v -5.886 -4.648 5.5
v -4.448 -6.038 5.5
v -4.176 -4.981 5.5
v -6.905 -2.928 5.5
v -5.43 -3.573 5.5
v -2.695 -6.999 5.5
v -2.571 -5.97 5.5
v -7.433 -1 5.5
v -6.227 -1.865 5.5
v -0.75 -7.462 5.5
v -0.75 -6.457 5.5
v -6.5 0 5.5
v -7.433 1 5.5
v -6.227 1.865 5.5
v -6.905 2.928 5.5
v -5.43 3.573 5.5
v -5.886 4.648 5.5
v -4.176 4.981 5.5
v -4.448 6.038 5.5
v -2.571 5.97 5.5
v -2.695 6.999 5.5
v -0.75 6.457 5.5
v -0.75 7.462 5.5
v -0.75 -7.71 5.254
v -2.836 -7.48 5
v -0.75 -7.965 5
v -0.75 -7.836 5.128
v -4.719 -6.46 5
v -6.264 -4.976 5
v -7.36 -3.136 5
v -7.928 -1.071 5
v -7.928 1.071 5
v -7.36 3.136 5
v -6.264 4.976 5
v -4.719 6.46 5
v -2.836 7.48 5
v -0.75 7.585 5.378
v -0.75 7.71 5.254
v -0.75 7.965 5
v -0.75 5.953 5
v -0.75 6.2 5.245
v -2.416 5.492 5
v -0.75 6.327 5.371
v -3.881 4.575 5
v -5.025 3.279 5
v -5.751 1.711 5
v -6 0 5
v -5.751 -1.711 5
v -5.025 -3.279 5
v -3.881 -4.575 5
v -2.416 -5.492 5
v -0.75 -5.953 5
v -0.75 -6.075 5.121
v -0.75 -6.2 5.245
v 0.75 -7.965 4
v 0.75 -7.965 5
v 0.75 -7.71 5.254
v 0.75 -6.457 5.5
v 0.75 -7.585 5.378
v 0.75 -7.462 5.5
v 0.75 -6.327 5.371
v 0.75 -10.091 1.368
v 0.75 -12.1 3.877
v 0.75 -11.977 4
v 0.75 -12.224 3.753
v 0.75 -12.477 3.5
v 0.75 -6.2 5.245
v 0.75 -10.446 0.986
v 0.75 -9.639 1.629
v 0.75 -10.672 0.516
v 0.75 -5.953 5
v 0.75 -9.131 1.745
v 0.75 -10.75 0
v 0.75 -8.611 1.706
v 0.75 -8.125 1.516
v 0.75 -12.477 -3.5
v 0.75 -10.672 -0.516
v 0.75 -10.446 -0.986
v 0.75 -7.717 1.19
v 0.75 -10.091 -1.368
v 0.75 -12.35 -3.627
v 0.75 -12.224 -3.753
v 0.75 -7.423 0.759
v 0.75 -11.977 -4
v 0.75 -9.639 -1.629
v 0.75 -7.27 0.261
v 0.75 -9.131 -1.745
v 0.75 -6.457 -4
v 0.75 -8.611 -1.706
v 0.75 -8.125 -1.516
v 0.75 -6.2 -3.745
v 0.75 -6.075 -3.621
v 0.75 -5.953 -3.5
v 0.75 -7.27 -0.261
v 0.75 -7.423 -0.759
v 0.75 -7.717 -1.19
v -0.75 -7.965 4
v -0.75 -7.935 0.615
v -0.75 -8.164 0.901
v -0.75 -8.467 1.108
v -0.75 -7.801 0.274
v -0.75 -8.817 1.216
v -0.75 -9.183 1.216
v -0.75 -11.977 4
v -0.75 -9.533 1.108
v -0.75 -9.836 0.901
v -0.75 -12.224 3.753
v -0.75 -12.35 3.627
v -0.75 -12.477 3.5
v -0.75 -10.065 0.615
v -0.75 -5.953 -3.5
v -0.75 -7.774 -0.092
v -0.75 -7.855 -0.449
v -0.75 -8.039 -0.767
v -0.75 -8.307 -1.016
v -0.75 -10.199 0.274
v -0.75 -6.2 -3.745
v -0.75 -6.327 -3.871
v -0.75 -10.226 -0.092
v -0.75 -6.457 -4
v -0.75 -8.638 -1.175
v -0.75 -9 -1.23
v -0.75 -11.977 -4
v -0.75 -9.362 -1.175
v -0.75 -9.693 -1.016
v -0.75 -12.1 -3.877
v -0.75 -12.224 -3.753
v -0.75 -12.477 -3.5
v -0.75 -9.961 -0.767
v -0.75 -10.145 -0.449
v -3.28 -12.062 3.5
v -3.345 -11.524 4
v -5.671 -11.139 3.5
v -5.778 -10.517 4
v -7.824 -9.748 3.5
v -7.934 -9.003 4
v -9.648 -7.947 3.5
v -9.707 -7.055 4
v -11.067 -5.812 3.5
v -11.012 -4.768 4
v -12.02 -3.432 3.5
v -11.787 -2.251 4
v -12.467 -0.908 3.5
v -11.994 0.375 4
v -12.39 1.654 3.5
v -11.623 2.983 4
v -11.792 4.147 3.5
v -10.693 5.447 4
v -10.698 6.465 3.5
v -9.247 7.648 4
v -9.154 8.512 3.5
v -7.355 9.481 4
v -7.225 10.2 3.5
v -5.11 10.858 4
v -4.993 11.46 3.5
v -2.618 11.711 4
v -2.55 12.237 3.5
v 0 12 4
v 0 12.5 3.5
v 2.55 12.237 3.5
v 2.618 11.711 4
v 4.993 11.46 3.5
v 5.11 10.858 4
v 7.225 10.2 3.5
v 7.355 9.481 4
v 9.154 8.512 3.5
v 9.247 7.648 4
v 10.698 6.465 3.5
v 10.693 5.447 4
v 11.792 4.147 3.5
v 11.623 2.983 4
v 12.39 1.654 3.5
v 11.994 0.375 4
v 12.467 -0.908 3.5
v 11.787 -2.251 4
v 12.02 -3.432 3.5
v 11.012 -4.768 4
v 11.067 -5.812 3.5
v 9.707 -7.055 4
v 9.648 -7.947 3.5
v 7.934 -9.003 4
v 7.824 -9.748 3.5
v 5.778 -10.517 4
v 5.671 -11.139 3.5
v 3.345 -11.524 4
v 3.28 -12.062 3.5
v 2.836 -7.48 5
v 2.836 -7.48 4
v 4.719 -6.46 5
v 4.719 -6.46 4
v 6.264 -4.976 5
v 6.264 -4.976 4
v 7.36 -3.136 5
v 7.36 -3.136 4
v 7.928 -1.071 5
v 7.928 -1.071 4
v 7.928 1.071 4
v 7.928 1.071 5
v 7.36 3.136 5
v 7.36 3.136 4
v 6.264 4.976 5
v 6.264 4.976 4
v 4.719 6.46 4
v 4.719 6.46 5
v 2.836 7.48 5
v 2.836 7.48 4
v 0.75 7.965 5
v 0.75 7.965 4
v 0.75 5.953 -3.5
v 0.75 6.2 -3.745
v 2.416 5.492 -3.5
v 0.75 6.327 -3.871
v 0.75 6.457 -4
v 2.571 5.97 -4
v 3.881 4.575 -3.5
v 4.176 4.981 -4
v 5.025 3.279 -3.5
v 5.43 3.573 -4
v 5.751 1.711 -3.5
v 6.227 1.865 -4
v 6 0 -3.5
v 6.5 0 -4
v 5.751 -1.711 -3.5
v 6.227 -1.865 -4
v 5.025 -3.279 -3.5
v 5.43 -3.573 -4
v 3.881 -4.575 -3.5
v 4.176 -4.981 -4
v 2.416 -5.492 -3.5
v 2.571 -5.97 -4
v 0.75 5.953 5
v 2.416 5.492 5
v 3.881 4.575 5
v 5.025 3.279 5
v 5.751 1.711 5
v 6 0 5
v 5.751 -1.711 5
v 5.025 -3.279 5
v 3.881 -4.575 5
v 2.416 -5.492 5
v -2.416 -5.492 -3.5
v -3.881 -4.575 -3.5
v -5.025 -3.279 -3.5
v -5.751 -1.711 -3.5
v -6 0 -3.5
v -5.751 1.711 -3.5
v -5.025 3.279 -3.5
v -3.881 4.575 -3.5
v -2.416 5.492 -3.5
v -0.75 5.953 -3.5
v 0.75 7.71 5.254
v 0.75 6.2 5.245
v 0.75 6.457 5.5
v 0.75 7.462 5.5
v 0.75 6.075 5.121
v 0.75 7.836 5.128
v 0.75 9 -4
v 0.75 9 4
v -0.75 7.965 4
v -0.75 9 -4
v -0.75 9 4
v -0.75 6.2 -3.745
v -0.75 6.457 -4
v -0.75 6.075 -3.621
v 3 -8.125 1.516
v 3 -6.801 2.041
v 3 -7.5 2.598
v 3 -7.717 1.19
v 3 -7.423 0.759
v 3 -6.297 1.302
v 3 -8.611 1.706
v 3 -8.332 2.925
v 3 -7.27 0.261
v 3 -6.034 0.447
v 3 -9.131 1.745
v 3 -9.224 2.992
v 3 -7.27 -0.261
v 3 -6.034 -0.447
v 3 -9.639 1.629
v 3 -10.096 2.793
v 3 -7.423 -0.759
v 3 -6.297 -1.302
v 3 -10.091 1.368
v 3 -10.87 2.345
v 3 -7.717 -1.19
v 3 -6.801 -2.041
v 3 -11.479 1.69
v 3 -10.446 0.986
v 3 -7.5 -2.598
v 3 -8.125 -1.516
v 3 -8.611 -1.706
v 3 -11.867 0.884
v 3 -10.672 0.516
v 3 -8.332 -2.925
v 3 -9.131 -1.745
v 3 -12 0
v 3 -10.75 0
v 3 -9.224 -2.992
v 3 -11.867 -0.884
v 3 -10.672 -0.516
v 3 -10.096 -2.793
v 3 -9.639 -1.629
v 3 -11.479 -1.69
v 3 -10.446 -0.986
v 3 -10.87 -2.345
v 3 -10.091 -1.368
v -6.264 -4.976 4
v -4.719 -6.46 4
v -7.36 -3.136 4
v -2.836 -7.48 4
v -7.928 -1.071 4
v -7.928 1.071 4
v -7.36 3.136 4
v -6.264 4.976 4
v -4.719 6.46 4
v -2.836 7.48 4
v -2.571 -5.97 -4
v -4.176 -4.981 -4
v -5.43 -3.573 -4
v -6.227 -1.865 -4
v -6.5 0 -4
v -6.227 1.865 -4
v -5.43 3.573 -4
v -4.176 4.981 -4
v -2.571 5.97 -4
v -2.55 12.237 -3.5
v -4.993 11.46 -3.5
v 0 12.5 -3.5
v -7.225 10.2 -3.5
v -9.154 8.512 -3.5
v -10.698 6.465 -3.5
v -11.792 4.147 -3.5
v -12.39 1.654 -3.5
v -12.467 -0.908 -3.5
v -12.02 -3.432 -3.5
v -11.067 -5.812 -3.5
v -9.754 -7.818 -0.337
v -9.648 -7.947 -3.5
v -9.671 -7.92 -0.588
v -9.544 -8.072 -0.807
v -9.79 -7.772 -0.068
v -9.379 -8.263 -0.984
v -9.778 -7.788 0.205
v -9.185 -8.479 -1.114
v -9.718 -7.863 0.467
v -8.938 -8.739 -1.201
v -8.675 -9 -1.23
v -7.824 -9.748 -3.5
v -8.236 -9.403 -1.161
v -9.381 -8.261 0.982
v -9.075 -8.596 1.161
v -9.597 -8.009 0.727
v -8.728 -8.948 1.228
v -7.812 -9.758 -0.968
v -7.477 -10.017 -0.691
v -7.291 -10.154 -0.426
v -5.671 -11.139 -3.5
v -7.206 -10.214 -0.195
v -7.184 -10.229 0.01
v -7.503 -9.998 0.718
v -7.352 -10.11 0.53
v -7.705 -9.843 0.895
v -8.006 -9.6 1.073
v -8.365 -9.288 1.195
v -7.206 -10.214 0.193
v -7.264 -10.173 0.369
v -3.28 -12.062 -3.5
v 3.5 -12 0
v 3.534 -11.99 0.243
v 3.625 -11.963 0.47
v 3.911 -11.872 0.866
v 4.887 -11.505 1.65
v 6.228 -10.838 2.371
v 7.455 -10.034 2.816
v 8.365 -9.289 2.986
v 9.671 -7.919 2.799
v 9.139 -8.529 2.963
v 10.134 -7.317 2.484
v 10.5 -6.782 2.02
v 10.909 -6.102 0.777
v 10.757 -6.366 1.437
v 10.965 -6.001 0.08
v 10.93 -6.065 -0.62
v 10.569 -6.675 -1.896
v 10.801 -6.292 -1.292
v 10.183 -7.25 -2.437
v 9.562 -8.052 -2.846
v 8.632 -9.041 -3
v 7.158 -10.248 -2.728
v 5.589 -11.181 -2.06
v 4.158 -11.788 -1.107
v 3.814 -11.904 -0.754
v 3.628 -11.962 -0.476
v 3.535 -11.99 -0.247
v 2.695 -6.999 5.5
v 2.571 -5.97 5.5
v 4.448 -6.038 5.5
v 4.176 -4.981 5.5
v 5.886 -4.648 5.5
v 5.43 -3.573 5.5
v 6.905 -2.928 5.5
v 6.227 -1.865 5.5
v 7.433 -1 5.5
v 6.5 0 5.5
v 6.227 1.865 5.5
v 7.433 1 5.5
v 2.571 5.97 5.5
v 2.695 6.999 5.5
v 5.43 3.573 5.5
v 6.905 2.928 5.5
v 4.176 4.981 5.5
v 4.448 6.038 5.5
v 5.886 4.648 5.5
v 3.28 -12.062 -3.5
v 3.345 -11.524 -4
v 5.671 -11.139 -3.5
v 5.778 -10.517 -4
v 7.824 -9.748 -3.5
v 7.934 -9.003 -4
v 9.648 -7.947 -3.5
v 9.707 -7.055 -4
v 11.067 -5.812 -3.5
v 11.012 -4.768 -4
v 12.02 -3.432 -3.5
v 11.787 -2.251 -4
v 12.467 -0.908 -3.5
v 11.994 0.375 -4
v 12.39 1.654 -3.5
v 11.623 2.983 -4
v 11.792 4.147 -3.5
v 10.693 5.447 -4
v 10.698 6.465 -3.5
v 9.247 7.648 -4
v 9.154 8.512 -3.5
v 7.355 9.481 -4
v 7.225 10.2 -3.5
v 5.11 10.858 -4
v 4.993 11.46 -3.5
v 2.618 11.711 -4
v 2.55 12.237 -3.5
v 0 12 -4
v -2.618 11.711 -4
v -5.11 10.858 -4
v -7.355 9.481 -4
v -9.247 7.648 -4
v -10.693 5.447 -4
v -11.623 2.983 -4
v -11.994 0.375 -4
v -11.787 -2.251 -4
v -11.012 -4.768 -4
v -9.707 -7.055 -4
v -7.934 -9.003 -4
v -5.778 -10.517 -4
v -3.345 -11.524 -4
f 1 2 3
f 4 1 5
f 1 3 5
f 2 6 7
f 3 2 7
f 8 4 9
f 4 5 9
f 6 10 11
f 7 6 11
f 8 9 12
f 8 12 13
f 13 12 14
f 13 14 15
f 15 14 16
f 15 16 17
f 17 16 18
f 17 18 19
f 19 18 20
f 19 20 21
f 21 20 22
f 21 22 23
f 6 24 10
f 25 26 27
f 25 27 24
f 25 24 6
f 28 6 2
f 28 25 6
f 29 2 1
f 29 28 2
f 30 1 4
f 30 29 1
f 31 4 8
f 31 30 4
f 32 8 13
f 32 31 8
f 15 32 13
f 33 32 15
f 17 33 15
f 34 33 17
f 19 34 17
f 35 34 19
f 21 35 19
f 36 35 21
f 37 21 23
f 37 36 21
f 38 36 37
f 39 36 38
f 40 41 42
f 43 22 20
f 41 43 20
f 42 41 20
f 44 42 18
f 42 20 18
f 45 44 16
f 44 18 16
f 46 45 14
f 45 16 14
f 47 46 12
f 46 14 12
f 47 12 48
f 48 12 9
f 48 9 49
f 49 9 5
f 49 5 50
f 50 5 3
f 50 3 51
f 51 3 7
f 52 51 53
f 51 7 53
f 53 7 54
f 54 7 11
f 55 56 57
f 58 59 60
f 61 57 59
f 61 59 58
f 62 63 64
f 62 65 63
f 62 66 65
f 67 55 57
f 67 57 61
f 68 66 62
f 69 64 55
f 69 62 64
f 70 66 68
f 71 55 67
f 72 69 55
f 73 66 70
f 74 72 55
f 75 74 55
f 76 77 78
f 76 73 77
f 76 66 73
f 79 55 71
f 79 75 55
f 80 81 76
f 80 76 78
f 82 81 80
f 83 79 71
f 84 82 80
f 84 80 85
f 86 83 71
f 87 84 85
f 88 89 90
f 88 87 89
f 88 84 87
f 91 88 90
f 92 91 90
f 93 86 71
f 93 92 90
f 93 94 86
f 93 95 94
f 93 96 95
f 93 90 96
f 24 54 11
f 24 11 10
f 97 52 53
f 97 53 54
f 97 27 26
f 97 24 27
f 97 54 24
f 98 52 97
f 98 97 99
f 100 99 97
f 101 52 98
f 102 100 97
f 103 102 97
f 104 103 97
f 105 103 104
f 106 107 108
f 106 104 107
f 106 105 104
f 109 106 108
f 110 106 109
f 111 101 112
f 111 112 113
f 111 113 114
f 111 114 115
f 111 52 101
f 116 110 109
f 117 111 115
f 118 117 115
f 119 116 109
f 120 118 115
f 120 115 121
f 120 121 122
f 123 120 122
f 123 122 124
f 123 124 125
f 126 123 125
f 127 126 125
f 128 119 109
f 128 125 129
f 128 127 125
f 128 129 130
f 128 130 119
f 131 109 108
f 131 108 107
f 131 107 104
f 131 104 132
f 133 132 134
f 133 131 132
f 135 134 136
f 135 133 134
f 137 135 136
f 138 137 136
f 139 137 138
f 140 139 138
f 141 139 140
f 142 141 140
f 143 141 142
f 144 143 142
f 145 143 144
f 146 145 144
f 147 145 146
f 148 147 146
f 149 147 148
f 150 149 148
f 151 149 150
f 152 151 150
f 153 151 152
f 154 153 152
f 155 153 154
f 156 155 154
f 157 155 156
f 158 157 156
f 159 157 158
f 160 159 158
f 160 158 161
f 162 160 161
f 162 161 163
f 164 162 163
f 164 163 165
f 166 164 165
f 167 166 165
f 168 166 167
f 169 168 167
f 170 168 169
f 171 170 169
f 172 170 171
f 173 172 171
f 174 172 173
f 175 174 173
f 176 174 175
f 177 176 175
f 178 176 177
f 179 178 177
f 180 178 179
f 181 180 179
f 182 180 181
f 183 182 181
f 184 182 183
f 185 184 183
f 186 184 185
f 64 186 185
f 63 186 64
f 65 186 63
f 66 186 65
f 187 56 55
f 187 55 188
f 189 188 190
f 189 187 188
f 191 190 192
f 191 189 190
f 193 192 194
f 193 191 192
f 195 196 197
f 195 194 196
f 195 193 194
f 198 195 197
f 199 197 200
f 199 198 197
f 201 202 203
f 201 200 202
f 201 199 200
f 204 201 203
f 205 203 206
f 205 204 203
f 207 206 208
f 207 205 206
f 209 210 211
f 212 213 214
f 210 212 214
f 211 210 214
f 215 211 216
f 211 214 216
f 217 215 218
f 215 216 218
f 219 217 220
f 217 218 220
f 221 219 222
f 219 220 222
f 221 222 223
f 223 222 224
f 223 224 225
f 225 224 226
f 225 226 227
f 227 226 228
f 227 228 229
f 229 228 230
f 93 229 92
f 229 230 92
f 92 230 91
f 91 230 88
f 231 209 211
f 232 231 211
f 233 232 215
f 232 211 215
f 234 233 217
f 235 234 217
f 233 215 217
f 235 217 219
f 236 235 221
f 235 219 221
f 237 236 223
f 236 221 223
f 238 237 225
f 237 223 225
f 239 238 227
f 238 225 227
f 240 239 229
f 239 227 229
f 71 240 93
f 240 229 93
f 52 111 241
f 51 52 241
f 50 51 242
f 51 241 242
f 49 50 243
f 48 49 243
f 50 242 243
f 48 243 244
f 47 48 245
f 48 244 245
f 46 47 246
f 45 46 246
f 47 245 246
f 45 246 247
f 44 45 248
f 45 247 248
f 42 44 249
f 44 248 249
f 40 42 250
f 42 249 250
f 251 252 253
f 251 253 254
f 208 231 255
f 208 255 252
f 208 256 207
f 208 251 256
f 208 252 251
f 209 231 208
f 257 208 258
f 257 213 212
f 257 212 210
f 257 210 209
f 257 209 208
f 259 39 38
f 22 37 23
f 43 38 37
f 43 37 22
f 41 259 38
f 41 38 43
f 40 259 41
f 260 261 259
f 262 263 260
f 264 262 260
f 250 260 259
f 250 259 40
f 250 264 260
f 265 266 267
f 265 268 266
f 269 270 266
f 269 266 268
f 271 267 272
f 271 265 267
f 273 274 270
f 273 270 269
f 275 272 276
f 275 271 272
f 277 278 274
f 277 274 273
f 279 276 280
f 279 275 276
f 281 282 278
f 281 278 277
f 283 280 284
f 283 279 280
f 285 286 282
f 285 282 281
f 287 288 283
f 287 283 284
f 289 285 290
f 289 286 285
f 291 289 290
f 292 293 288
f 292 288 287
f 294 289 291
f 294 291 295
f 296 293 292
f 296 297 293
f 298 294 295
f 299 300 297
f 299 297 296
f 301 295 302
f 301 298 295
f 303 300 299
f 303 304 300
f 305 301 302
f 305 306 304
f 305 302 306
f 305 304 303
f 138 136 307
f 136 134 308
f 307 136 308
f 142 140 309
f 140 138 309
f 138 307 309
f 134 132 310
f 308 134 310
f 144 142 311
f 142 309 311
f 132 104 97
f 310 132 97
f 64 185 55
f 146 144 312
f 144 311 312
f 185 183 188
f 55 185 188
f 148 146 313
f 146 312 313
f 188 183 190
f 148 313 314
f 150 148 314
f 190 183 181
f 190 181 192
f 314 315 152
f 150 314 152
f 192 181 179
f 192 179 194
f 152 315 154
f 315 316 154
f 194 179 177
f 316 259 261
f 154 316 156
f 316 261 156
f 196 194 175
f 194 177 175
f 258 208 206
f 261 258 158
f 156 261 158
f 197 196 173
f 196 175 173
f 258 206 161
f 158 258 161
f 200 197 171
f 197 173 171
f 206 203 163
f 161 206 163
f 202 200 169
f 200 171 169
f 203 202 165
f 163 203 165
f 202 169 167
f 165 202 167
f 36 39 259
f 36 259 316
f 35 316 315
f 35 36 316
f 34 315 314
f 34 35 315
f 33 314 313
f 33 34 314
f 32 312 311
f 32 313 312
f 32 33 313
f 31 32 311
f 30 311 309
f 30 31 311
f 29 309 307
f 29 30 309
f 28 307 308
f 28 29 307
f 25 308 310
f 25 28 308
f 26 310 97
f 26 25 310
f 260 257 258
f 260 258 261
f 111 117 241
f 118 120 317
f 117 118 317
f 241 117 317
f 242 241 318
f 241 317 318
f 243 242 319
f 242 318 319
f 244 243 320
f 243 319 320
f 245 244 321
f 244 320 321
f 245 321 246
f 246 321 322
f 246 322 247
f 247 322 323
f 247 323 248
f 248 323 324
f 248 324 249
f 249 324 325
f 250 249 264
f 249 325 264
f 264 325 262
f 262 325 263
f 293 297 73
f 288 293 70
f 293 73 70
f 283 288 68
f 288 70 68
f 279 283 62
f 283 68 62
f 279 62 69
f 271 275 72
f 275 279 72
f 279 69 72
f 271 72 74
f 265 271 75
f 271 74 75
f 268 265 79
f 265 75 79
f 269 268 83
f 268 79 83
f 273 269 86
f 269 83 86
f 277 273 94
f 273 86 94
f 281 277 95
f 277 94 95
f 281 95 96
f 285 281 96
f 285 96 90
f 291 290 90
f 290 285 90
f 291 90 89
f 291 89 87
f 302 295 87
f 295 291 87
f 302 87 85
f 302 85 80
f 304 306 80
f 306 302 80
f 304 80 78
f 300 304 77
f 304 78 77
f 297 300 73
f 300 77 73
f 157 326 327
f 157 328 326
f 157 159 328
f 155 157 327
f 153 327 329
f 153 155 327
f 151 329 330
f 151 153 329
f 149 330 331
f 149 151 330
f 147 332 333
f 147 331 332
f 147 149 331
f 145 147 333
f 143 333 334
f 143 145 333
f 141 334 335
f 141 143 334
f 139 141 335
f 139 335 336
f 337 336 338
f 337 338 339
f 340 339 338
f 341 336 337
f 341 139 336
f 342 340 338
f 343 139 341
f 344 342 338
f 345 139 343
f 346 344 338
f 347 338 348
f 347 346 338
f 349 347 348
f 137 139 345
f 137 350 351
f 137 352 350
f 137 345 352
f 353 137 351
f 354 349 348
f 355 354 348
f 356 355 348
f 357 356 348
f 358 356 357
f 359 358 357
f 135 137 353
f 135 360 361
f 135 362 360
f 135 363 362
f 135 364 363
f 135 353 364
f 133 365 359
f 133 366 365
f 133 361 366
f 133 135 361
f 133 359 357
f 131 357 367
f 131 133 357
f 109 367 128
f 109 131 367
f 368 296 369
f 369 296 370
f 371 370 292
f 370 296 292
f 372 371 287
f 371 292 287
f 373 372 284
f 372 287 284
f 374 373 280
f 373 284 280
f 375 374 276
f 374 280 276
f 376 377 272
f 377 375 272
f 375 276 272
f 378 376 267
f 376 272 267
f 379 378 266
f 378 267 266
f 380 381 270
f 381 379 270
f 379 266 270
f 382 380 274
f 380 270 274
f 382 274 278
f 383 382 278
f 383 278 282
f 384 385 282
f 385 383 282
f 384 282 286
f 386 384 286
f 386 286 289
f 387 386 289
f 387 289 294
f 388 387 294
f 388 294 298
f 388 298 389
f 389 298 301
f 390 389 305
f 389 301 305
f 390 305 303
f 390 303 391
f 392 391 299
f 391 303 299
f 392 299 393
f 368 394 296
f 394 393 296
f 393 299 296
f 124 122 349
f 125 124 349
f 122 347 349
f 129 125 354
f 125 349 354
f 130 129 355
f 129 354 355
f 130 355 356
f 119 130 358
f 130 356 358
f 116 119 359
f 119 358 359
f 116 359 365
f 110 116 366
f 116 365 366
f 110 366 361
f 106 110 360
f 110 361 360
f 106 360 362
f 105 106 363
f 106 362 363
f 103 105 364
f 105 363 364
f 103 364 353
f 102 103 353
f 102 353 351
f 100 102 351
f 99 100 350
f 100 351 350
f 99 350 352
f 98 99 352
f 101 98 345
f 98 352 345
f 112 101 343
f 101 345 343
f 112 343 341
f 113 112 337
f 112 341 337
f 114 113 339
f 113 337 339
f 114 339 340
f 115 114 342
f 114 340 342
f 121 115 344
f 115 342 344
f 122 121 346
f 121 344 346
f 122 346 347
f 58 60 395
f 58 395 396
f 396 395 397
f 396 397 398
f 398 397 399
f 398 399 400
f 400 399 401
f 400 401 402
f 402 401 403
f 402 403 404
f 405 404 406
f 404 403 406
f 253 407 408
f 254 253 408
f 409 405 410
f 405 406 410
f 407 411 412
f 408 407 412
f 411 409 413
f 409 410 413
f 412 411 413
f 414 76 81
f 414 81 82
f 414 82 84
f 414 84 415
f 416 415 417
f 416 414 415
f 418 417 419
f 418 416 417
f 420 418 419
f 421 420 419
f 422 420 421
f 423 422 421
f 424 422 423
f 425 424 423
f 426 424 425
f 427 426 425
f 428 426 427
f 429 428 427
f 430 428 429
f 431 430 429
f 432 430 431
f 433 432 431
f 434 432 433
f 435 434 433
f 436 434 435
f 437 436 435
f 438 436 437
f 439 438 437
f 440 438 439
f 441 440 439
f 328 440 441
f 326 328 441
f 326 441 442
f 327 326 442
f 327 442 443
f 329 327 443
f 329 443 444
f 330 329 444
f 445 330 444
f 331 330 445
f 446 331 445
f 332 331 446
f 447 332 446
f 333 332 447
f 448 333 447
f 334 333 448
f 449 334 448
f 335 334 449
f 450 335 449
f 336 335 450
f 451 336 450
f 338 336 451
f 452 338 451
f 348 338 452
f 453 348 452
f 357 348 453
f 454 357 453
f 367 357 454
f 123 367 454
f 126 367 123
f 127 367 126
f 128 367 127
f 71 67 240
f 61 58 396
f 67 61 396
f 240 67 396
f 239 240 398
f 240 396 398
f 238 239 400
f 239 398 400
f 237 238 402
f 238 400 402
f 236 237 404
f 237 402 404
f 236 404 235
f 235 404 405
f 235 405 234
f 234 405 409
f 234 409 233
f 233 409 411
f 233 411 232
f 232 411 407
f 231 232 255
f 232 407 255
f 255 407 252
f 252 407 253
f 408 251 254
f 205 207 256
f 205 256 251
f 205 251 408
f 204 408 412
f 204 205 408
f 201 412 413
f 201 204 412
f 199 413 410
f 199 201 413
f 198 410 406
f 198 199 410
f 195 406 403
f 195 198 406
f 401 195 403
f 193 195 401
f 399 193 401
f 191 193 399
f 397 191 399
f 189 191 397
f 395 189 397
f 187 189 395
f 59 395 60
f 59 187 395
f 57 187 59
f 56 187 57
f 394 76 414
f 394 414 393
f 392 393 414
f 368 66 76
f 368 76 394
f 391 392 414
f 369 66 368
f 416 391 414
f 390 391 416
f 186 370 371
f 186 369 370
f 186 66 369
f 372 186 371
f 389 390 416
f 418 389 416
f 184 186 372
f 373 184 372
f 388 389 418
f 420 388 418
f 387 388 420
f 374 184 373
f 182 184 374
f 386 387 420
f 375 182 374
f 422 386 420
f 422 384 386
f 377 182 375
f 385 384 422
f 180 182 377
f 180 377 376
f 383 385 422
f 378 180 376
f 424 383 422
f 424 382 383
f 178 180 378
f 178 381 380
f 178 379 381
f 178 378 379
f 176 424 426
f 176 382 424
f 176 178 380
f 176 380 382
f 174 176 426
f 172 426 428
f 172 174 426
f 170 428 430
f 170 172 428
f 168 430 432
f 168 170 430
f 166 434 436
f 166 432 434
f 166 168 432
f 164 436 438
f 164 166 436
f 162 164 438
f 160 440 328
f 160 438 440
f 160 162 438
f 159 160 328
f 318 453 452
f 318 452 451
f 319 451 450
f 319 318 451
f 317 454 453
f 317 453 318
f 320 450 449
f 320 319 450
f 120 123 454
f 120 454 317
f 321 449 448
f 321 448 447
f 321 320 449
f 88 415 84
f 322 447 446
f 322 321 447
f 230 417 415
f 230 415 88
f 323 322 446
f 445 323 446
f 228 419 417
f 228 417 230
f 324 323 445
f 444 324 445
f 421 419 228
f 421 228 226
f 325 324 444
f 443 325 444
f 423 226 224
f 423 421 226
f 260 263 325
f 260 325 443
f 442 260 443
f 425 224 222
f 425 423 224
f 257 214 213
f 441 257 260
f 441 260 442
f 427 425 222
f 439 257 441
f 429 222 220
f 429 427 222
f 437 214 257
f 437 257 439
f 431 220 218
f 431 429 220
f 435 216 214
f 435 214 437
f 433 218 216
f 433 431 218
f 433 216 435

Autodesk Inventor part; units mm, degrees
sketch "Sketch_1" plane through (0, 0, 0) normal (1, 0, 0) x (0, 1, 0)
  line L0 (0, -4) -> (0, 5.5)
  line L1 (7.5, 5.5) -> (6.5, 5.5)
  line L2 (6.5, 5.5) -> (6, 5)
  line L3 (6, 5) -> (6, -3.5)
  line L4 (6, -3.5) -> (6.5, -4)
  line L5 (6.5, -4) -> (12, -4)
  line L6 (12, -4) -> (12.5, -3.5)
  line L7 (12.5, -3.5) -> (12.5, 3.5)
  line L8 (12.5, 3.5) -> (12, 4)
  line L9 (12, 4) -> (8, 4)
  line L10 (8, 4) -> (8, 5)
  line L11 (8, 5) -> (7.5, 5.5)
revolve "Revolution1" add sketch "Sketch_1" angle 360 about axis through (0, 0, -4) along (0, 0, -1)
sketch "Sketch_2" plane through (0, 0, 0) normal (0, 0, 1) x (1, 0, 0)
  line L0 (-0.75, -12.5) -> (0.75, -12.5)
  line L1 (0.75, -12.5) -> (0.75, 9)
  line L2 (0.75, 9) -> (-0.75, 9)
  line L3 (-0.75, 9) -> (-0.75, -12.5)
extrude "Extrusion1" cut sketch "Sketch_2" along normal mid plane 32
sketch "Sketch_3" plane through (0, 0, 0) normal (0, 0, 1) x (1, 0, 0)
  line L0 (0, -9) -> (12.5, -9)
  line L1 (12.5, -9) -> (12.5, -12)
  line L2 (12.5, -12) -> (3, -12)
  line L3 (3, -12) -> (3, -10.75)
  line L4 (3, -10.75) -> (0, -10.75)
  line L5 (0, -10.75) -> (0, -9)
  line L6 (0, -9) -> (12.5, -9)
revolve "Revolution2" cut sketch "Sketch_3" angle 360 about axis through (0, -9, 0) along (1, 0, 0)
sketch "Sketch4" plane through (-0.75, -11.9765, -4) normal (1, 0, 0) x (0, 0, -1)
  point P0 (-4, 2.9765)
hole "Hole1" at (-0.75, -9, 0) direction (-1, 0, 0) diameter 2.459 depth 13.5 thread size "M3x0.5" class "6H" standard "ISO Metric profile"
ref_plane "body_screw_XY" through (3, -9, 0) normal (1, 0, 0) x (0, 0, -1)
ref_plane "body_screw_YZ" through (3, -9, 0) normal (0, 0, -1) x (0, 1, 0)
ref_plane "body_screw_ZX" through (3, -9, 0) normal (0, 1, 0) x (1, 0, 0)
properties part number "SCSNAJ12-16b"
